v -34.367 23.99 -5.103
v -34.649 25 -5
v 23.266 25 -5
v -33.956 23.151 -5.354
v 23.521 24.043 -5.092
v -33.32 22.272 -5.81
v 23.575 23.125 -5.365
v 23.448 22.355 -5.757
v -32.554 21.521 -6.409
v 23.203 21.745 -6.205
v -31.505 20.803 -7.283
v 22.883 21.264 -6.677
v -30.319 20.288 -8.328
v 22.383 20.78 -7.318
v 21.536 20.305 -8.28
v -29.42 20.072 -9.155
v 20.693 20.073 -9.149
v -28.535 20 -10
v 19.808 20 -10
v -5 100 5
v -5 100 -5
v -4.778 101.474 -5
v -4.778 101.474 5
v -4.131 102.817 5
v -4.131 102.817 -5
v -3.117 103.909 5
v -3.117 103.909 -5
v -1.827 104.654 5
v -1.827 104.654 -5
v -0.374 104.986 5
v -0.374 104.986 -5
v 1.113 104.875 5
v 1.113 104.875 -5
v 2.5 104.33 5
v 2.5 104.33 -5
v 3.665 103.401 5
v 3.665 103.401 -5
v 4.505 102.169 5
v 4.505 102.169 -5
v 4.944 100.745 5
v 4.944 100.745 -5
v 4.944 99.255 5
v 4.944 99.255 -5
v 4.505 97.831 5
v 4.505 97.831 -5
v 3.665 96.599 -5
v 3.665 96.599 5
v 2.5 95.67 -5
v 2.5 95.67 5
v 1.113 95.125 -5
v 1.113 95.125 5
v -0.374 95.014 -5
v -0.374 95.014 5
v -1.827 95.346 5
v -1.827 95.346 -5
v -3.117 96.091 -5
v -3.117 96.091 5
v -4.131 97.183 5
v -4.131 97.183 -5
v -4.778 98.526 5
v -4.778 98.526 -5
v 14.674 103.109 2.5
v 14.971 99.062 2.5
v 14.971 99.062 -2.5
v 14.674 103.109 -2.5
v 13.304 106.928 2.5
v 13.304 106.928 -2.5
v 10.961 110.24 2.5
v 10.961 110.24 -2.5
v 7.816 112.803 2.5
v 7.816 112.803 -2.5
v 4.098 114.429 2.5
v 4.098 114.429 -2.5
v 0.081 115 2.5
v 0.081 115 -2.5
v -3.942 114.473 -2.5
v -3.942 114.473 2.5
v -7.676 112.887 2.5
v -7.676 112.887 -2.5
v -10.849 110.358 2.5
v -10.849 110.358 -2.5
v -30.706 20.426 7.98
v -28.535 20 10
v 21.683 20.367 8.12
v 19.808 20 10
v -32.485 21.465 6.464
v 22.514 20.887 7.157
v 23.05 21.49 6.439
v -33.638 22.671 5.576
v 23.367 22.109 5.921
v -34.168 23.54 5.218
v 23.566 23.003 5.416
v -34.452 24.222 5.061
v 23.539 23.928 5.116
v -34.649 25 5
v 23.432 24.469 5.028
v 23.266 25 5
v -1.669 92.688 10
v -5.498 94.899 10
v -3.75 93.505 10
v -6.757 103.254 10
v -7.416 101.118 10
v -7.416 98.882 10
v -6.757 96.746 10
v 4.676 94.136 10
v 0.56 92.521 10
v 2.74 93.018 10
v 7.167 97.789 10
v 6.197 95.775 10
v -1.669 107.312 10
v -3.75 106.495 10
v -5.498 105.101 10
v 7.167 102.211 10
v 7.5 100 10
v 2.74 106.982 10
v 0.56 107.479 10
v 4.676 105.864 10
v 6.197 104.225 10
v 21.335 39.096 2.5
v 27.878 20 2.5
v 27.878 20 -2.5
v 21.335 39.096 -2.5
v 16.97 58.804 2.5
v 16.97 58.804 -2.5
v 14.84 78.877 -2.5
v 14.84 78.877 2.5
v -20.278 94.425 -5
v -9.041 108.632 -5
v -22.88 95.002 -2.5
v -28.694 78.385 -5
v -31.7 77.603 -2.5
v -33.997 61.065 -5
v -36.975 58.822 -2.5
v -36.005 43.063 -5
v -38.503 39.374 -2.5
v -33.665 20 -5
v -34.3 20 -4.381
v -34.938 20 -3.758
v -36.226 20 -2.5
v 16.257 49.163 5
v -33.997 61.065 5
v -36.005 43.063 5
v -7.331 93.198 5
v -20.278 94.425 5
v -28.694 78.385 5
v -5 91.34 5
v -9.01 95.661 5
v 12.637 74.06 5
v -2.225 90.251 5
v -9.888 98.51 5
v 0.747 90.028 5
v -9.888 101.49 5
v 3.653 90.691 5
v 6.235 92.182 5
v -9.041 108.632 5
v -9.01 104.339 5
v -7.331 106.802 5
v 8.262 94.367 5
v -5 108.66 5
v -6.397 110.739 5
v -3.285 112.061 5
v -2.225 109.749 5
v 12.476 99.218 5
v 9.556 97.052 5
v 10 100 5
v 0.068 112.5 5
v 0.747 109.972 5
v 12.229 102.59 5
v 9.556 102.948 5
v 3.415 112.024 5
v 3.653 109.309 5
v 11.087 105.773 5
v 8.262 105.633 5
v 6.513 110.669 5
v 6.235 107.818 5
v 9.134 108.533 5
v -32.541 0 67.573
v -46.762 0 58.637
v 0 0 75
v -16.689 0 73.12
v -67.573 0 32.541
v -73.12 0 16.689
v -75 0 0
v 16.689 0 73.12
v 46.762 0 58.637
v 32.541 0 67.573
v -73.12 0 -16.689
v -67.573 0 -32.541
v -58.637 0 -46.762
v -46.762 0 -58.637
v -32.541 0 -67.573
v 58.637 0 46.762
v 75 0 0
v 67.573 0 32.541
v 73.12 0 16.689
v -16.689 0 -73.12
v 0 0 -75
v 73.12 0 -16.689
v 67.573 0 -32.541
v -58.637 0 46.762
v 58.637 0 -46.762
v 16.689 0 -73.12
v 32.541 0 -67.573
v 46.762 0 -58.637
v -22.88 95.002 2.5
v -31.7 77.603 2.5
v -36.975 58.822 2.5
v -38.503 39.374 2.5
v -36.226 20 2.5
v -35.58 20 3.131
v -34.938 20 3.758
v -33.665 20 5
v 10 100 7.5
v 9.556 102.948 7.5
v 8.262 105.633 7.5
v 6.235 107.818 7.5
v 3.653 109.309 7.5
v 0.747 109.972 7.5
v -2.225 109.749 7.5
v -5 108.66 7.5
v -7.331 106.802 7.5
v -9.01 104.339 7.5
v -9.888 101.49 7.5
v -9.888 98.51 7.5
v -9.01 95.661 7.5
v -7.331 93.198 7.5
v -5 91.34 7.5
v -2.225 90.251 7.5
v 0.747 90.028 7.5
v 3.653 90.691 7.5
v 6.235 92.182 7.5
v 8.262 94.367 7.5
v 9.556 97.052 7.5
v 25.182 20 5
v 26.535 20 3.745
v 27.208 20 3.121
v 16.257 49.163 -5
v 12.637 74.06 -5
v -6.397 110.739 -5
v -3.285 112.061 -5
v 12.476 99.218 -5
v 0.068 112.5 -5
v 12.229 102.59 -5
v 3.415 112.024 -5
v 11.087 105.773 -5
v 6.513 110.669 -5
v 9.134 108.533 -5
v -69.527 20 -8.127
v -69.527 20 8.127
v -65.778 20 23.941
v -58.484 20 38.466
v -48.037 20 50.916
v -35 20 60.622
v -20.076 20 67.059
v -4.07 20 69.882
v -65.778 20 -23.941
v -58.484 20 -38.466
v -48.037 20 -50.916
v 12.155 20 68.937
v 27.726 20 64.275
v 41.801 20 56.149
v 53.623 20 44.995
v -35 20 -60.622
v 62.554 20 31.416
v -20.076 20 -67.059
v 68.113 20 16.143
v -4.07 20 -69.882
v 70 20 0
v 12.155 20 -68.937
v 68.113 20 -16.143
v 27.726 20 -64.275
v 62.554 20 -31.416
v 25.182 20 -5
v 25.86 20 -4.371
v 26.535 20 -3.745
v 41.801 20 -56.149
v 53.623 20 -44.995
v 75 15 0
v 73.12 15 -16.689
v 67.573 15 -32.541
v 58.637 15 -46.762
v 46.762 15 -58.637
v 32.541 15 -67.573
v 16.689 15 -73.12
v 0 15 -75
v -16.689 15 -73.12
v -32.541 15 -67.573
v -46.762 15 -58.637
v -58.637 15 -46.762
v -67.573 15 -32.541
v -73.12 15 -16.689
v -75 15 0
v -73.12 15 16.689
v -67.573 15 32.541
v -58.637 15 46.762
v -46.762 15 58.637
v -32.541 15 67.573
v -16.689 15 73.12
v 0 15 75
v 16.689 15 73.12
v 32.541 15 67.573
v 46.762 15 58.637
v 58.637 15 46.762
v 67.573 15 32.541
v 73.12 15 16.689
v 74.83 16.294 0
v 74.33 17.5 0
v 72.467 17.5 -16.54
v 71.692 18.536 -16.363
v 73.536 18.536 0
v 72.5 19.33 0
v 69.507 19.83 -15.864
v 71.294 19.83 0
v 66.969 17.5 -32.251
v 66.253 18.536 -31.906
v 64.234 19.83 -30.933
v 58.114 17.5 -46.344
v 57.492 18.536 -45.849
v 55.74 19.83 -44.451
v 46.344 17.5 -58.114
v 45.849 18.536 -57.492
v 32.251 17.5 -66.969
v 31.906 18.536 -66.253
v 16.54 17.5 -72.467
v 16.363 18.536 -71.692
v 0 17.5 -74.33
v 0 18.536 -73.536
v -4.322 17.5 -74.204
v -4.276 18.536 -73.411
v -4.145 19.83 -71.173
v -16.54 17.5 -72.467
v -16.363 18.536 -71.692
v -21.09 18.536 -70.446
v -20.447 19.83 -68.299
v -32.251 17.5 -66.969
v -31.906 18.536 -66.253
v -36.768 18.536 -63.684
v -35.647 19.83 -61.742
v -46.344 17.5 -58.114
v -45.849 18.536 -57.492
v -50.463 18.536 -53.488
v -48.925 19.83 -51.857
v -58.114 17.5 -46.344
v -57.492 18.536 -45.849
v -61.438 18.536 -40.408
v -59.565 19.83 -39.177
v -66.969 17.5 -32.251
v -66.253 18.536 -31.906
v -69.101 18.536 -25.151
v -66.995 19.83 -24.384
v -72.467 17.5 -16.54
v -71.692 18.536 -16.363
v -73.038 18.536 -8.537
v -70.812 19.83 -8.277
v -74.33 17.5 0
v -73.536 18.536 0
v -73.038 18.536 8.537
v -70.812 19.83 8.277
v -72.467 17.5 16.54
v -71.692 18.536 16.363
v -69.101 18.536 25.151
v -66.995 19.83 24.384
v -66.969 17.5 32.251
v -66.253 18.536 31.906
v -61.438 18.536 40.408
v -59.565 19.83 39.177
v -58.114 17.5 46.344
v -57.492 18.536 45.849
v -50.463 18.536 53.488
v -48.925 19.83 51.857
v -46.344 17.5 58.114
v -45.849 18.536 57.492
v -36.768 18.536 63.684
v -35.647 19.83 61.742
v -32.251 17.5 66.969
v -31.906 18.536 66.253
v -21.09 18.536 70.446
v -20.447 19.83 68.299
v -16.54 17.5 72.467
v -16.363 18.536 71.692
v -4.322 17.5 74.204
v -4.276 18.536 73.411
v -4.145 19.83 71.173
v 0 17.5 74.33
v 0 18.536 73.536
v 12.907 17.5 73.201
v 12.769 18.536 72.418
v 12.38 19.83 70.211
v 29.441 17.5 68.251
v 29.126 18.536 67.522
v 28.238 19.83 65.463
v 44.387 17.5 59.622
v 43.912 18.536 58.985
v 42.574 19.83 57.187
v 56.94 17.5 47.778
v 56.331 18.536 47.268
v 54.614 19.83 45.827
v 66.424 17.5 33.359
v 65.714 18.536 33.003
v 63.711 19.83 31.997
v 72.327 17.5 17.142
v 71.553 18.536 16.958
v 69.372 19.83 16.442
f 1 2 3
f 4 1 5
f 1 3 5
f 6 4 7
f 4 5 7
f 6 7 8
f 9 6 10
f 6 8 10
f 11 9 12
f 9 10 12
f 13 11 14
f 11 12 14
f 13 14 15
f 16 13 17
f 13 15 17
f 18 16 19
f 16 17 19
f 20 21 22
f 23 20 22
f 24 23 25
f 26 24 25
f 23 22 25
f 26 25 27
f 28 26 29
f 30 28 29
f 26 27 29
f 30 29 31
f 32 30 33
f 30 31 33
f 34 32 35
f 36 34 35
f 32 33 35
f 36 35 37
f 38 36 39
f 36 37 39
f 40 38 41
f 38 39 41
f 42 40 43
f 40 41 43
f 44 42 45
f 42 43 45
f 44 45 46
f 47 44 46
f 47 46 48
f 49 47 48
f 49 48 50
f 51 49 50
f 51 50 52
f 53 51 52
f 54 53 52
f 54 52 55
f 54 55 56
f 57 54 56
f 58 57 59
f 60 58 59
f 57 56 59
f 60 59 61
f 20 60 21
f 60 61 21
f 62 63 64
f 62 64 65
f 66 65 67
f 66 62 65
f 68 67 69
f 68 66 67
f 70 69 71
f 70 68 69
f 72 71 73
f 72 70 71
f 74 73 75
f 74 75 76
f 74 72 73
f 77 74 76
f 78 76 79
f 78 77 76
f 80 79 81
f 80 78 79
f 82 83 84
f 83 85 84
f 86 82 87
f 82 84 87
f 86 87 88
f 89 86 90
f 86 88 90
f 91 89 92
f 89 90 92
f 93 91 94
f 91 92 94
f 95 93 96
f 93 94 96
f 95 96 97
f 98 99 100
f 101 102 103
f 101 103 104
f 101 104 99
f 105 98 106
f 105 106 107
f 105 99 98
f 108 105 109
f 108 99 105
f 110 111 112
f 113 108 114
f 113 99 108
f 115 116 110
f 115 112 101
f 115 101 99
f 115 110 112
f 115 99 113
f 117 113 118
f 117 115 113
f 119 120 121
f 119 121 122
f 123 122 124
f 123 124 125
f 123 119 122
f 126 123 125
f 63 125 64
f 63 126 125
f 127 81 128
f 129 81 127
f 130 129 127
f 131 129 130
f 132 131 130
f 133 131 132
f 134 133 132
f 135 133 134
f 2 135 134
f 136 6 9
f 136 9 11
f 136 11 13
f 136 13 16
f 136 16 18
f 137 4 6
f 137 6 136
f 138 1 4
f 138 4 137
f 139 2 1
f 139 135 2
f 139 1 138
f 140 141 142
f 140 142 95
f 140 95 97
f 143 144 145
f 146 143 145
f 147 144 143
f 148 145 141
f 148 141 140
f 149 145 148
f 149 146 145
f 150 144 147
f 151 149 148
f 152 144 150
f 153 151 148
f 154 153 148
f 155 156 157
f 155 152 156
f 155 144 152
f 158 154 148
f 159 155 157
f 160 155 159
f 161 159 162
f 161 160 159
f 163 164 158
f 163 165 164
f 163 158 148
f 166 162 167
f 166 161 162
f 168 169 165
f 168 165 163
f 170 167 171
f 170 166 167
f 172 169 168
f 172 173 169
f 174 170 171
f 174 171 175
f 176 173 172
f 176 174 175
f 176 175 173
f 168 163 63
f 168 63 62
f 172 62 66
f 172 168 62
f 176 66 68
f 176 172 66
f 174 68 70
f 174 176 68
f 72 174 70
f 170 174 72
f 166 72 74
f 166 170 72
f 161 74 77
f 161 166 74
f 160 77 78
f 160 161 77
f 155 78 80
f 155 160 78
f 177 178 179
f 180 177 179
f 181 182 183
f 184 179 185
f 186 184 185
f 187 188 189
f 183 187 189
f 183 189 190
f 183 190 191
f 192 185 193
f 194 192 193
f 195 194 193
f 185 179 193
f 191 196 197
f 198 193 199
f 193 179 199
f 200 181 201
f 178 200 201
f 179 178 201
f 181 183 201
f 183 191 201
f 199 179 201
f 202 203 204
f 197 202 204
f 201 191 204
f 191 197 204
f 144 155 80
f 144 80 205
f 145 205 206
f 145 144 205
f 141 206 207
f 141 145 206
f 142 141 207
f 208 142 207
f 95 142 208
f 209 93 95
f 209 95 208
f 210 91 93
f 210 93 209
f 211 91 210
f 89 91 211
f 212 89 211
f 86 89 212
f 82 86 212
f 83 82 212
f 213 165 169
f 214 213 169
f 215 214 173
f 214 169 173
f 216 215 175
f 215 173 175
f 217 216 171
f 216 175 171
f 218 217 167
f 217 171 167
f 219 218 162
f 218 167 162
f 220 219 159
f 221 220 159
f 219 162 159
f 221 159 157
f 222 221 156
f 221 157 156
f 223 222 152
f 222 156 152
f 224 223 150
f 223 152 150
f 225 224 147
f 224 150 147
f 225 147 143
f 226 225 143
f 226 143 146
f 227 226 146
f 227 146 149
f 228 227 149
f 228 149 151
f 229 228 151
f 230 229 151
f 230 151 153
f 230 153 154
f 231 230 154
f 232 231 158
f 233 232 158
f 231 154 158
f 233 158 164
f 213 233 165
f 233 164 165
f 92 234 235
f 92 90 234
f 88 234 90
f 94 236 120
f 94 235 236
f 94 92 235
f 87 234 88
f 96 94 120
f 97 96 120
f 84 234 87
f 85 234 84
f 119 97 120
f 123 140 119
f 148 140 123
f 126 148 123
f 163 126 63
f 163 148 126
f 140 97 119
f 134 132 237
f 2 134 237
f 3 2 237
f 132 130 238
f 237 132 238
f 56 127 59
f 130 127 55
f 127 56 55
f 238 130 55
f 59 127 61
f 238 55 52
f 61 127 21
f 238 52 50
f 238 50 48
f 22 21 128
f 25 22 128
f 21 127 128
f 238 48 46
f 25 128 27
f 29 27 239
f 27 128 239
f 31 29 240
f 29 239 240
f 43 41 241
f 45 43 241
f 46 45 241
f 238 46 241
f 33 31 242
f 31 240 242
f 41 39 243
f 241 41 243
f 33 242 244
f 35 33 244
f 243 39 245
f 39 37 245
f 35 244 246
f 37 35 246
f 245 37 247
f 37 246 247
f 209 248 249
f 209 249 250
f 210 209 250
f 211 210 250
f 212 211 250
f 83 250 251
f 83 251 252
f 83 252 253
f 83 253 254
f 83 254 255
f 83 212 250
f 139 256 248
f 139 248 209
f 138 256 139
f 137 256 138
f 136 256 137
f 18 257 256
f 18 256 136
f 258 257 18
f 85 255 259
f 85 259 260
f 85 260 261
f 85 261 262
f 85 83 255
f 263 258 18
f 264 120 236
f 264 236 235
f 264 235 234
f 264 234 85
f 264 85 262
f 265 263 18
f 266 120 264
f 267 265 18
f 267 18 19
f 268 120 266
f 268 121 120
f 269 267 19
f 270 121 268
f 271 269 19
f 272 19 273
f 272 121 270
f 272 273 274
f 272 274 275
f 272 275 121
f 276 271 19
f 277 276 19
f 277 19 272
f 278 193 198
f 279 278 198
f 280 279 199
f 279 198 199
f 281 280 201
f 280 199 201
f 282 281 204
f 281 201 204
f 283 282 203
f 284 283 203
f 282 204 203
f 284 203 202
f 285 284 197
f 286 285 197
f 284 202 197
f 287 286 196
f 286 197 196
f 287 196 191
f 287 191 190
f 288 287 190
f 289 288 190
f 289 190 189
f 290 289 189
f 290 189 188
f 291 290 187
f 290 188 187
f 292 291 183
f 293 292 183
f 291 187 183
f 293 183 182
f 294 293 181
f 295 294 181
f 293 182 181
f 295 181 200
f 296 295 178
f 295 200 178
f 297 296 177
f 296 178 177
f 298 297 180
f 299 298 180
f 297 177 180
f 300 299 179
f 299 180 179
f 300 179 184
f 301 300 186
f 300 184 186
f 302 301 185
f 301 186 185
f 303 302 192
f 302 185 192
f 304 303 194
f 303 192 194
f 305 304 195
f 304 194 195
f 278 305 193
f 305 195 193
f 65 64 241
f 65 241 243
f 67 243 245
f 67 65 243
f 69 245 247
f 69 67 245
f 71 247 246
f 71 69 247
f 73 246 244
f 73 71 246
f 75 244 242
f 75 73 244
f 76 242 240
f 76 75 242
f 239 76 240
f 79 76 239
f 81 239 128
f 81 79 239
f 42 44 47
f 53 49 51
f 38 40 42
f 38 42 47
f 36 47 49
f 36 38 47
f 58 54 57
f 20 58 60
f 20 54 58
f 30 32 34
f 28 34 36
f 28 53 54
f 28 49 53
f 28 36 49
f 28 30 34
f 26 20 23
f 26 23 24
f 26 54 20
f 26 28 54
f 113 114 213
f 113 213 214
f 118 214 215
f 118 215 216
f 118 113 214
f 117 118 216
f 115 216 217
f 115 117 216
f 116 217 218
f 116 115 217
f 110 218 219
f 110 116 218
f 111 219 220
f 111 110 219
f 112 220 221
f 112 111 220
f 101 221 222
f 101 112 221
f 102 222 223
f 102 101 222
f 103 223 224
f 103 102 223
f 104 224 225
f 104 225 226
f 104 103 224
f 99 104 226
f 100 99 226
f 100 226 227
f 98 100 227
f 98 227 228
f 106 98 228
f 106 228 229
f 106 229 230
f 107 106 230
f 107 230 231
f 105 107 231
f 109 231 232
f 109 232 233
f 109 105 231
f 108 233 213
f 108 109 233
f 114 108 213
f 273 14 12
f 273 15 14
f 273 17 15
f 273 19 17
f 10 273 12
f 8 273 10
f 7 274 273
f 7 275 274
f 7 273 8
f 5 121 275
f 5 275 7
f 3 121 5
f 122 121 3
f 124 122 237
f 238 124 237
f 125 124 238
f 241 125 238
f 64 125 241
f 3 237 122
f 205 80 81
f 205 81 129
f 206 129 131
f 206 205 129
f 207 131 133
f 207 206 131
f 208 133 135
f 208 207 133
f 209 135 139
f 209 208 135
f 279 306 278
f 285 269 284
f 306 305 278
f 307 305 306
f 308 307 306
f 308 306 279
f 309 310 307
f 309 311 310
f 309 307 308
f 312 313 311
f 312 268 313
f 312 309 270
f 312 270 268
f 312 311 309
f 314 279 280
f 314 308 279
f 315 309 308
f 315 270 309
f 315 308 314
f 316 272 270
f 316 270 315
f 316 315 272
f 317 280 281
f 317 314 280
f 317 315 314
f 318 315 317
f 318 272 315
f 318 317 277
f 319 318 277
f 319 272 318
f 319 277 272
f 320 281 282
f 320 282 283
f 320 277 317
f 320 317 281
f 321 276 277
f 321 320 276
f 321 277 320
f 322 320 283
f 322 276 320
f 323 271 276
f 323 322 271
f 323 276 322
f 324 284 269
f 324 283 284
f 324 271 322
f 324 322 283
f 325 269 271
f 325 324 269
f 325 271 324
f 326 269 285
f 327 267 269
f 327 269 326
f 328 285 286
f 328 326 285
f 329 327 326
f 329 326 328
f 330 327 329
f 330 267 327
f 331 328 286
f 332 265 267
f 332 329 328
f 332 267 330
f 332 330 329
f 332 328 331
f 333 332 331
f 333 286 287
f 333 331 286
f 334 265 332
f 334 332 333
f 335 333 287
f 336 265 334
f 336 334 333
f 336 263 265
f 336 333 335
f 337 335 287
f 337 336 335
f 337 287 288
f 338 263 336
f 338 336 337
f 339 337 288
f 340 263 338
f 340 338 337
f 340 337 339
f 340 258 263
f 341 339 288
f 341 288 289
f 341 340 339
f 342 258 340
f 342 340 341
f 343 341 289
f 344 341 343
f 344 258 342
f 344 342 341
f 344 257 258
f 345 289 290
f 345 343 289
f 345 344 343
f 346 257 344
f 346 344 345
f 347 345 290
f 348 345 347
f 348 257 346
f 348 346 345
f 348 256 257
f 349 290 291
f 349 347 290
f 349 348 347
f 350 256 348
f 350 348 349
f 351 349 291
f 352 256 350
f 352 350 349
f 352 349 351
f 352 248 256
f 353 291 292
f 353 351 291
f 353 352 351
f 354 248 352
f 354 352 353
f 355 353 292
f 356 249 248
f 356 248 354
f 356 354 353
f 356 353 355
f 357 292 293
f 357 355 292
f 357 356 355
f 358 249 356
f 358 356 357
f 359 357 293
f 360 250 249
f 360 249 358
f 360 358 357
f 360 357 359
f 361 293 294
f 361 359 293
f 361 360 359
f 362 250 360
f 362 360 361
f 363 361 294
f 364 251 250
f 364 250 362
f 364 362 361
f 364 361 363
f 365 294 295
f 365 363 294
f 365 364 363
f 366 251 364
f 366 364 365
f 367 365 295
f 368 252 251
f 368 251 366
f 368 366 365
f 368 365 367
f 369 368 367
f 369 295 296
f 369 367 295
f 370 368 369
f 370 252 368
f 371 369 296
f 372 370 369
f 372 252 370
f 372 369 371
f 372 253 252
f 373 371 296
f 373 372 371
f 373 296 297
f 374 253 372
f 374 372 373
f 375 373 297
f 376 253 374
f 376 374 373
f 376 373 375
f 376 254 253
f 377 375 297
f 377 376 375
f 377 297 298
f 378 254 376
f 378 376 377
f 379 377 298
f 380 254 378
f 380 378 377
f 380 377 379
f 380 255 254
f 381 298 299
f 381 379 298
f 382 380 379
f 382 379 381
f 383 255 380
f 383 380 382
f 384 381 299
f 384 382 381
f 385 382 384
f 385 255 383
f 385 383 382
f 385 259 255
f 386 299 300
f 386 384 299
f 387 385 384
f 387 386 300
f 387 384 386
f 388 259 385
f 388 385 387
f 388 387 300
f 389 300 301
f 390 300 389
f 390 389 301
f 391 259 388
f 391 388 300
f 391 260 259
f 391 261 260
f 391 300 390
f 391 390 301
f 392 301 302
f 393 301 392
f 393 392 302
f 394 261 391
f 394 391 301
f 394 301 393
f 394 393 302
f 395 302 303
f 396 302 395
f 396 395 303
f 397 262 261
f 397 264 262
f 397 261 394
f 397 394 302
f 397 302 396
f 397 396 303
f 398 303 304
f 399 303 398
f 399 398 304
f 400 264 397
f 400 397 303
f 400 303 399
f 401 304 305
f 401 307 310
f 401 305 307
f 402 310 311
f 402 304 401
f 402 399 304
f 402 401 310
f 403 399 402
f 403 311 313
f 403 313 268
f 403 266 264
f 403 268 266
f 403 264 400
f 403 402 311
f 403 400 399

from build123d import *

# Parameters (mm, degrees)
SKETCH1_R           = 75
BOSS_EXTRUDE1_DEPTH = 20
FILLET1_R           = 5
BOSS_EXTRUDE2_DEPTH = 5
CHAMFER1_SIZE       = 2.5
FILLET2_R           = 5
SKETCH3_R           = 10
BOSS_EXTRUDE3_DEPTH = 5
CHAMFER2_SIZE       = 2.5
SKETCH4_R           = 5
CUT_EXTRUDE1_DEPTH  = 10


with BuildPart() as part:
    # Sketch1 → Boss-Extrude1 (new body)
    with BuildSketch(Plane(origin=(0, 0, 0), x_dir=(1, 0, 0), z_dir=(0, 1, 0))):
        Circle(SKETCH1_R)
    extrude(amount=BOSS_EXTRUDE1_DEPTH)

    # Fillet1
    fillet1_edges = [part.edges().sort_by_distance(p)[0] for p in [
        (-75, 20, 0),
    ]]
    fillet(fillet1_edges, radius=FILLET1_R)

    # Sketch2 → Boss-Extrude2 (add, symmetric)
    with BuildSketch(Plane.XY):
        with BuildLine():
            Line((-35, 15), (30, 15))
            ThreePointArc((30, 15), (17.428098582, 56.126843631), (14.970645506, 99.06203778))
            ThreePointArc((14.970645506, 99.06203778), (6.012327577, 113.742340307), (-10.849201429, 110.358321696))
            ThreePointArc((-10.849201429, 110.358321696), (-35.460543036, 65.854059614), (-35, 15))
        make_face()
    extrude(amount=BOSS_EXTRUDE2_DEPTH, both=True)

    # Chamfer1
    chamfer1_edges = [part.edges().sort_by_distance(p)[0] for p in [
        (16.970295051, 58.803839559, -5),
        (6.012327577, 113.742340307, -5),
        (-34.796467261, 68.341174934, -5),
        (16.970295051, 58.803839559, 5),
        (6.012327577, 113.742340307, 5),
        (-34.796467261, 68.341174934, 5),
    ]]
    chamfer(chamfer1_edges, length=CHAMFER1_SIZE)

    # Fillet2
    fillet2_edges = [part.edges().sort_by_distance(p)[0] for p in [
        (-4.241511046, 20, -5),
        (-4.241511046, 20, 5),
    ]]
    fillet(fillet2_edges, radius=FILLET2_R)

    # Sketch3 → Boss-Extrude3 (add)
    with BuildSketch(Plane.XY.offset(5)):
        with Locations((0, 100)):
            Circle(SKETCH3_R)
    extrude(amount=BOSS_EXTRUDE3_DEPTH)

    # Chamfer2
    chamfer2_edges = [part.edges().sort_by_distance(p)[0] for p in [
        (-10, 100, 10),
    ]]
    chamfer(chamfer2_edges, length=CHAMFER2_SIZE)

    # Sketch4 → Cut-Extrude1 (cut)
    with BuildSketch(Plane(origin=(0, 0, -5), x_dir=(-1, 0, 0), z_dir=(0, 0, -1))):
        with Locations((0, 100)):
            Circle(SKETCH4_R)
    extrude(amount=-CUT_EXTRUDE1_DEPTH, mode=Mode.SUBTRACT)


solid = part.part
